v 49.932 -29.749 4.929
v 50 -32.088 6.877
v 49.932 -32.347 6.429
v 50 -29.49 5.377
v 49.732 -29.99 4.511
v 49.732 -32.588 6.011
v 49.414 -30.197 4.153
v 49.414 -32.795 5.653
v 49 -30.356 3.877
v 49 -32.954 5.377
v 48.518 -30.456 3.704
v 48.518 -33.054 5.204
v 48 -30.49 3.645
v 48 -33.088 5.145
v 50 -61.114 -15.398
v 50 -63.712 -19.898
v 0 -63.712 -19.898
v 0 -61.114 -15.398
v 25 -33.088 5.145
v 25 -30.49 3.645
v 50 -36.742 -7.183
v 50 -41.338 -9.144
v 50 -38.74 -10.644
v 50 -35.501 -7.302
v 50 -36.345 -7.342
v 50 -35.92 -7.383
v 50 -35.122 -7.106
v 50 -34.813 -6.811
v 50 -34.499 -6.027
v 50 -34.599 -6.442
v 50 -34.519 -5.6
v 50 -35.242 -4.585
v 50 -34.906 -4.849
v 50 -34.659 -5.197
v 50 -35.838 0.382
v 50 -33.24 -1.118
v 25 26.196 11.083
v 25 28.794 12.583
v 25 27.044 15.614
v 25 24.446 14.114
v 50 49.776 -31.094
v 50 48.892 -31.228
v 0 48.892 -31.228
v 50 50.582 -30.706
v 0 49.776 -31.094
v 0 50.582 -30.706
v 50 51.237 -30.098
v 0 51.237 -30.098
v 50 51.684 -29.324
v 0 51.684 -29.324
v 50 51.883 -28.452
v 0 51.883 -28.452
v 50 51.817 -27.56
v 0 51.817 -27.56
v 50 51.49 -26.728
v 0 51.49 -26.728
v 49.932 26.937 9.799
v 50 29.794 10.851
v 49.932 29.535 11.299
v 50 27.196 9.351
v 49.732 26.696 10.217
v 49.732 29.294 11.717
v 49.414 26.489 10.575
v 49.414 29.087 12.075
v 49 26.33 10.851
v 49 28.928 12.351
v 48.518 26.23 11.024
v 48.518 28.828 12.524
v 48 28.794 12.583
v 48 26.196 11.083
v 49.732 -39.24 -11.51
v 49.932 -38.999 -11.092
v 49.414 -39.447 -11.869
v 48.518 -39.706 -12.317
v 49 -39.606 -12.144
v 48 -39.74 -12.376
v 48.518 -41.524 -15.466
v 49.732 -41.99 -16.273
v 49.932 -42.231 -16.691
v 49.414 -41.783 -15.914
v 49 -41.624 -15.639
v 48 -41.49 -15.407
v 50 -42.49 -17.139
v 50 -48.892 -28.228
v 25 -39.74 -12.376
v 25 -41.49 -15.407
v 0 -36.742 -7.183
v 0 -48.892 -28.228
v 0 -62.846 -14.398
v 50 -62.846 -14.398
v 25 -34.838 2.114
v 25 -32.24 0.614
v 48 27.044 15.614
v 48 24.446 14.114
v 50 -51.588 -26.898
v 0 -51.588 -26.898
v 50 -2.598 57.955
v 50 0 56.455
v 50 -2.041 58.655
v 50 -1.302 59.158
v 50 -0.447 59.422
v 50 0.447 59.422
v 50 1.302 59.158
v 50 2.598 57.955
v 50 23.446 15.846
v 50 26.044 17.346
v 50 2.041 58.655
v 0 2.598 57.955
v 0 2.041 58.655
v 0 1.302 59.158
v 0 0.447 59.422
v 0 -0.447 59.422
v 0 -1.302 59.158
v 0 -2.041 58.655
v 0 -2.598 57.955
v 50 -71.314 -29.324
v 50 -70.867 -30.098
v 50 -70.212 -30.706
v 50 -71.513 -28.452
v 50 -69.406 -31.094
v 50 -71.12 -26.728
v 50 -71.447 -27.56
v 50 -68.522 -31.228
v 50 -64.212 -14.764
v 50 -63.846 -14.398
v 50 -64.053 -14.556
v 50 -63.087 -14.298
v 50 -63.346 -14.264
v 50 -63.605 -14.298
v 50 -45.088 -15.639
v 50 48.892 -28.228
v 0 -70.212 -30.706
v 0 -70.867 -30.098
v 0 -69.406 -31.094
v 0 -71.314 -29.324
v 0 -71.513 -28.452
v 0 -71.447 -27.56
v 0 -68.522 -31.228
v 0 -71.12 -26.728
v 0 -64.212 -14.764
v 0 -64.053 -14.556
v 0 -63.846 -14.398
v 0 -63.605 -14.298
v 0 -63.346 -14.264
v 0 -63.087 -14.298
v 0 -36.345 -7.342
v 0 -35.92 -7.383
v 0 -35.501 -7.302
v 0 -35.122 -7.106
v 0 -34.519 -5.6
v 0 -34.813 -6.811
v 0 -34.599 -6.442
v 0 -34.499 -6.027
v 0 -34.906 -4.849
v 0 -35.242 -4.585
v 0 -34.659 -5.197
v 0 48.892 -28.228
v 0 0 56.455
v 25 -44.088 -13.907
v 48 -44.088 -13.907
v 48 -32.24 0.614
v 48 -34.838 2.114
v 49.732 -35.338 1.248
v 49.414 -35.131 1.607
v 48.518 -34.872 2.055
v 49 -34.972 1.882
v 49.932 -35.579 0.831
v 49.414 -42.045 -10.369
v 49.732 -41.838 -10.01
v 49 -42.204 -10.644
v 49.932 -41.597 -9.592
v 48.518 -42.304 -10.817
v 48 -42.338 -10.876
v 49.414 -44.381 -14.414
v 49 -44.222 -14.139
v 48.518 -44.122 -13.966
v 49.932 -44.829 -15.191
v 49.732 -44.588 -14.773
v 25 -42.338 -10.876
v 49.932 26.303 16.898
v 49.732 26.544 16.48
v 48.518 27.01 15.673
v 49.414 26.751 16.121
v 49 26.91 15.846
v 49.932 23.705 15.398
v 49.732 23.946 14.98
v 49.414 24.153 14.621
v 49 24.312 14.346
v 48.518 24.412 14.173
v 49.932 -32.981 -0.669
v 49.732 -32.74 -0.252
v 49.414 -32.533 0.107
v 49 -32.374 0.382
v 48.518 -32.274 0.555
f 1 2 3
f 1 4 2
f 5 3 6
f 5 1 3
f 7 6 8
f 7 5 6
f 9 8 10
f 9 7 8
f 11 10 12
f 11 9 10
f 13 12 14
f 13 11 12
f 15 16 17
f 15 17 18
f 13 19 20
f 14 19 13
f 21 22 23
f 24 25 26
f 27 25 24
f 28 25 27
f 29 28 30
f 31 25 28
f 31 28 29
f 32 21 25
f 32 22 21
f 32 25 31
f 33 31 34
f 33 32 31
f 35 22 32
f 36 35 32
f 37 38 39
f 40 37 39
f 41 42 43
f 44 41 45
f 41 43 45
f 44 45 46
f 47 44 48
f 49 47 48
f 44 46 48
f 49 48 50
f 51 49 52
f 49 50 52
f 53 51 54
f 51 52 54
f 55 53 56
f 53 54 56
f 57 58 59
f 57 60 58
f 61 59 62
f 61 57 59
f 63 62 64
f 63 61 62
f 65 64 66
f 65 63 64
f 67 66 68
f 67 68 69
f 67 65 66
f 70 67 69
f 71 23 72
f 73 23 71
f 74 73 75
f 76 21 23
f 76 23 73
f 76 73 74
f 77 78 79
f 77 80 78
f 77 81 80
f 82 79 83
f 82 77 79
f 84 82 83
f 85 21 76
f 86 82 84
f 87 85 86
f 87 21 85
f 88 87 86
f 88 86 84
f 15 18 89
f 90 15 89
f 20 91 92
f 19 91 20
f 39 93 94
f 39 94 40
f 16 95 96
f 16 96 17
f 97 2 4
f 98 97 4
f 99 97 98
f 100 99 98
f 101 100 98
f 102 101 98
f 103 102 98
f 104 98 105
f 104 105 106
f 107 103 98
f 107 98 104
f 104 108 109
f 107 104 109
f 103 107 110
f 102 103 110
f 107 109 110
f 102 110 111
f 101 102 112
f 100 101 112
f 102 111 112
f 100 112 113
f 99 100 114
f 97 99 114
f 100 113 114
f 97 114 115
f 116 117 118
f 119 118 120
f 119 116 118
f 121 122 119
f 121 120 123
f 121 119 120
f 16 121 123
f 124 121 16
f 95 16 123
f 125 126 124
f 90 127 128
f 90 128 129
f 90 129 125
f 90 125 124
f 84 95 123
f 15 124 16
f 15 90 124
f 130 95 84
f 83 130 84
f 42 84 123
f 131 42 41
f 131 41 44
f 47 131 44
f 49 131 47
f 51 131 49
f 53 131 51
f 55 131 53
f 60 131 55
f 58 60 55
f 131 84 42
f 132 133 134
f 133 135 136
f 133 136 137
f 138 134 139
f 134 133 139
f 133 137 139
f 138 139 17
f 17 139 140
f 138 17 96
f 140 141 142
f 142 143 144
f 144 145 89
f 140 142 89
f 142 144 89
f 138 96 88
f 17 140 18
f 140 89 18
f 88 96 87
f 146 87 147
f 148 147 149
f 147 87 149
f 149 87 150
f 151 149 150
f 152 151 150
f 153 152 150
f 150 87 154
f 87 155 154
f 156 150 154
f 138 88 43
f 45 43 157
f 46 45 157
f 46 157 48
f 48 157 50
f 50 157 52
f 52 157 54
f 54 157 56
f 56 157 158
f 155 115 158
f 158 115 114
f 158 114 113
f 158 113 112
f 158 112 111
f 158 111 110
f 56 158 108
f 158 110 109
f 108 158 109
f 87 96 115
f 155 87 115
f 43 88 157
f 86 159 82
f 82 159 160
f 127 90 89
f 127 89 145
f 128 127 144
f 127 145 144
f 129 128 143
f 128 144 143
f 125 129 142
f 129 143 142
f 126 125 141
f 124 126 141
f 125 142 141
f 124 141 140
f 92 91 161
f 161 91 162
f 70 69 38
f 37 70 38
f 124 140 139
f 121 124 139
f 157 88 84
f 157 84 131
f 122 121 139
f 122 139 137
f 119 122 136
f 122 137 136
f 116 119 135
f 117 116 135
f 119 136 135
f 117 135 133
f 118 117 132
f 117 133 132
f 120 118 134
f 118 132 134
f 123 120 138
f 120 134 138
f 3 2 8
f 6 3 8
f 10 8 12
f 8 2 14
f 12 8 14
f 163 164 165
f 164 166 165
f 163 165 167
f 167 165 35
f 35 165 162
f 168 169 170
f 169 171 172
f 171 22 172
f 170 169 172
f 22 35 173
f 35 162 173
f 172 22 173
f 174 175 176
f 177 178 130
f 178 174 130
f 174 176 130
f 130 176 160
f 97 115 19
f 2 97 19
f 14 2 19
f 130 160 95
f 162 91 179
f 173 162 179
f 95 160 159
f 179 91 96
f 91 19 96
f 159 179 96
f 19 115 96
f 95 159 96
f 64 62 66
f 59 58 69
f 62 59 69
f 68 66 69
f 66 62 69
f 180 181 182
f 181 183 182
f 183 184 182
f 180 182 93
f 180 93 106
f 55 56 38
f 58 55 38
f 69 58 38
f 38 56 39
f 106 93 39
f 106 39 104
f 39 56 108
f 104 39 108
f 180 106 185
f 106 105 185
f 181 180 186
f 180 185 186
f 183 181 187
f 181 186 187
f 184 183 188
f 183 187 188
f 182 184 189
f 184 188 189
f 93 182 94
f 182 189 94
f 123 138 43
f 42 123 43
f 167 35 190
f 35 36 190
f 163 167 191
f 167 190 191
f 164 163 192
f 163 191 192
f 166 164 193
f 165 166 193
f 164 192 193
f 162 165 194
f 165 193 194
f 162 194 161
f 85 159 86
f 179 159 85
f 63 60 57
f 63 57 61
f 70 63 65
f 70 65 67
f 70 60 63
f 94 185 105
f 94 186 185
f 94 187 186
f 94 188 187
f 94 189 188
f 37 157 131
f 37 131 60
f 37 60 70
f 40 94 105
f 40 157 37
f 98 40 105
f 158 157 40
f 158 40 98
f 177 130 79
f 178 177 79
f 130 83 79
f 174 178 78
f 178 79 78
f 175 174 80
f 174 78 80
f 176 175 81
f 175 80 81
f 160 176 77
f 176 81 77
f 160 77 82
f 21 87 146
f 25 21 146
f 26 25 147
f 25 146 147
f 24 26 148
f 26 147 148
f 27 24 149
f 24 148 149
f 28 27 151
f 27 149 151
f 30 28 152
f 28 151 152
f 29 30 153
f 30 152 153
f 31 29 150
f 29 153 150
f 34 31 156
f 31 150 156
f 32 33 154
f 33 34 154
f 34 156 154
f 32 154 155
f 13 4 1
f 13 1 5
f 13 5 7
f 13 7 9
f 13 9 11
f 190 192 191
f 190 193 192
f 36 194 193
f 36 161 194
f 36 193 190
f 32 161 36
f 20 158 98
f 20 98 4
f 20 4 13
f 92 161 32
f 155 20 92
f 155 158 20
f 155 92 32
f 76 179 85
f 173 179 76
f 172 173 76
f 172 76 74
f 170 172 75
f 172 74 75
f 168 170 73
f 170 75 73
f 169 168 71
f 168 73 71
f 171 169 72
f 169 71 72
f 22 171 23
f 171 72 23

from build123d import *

# Parameters (mm, degrees)
F1_DEPTH  = 50
F2_T      = 3
F4_DEPTH  = 50
F5_W      = 25
F5_H      = 3.5
F6_DEPTH  = 3
F7_W      = 25
F7_H      = 3.5
F8_DEPTH  = 3
F9_R      = 2
F10_R     = 1.5
F11_DEPTH = 50
F12_W     = 25
F12_H     = 3.5
F13_DEPTH = 10
F14_R     = 2


# Not quite as in the source:
# - a shell that OpenCascade refuses in one call is made with other operations: the cavity is built on its own and cut out


with BuildPart() as f1:
    # F0 (on Right) → F1 (new body)
    with BuildSketch(Plane.YZ):
        with BuildLine():
            Line((-2.5980762114, 57.9554029985), (-54.0879656003, -31.2277014993))
            Line((-54.0879656003, -31.2277014993), (48.8918131776, -31.2277014993))
            ThreePointArc((48.8918131776, -31.2277014993), (51.4898893889, -29.7277014993), (51.4898893889, -26.7277014993))
            Line((51.4898893889, -26.7277014993), (2.5980762114, 57.9554029985))
            ThreePointArc((2.5980762114, 57.9554029985), (0, 59.4554029985), (-2.5980762114, 57.9554029985))
        make_face()
    extrude(amount=F1_DEPTH)

    # F2: shell of thickness 3, made by hand


with BuildPart() as f2_core1:
    # F2_t2: copy of F1
    add(f1.part)

    # the walls: a layer under each face that stays
    f2_faces = [f2_core1.faces().sort_by_distance(p)[0] for p in [
        (25, -28.3430209058, 13.3638507496),
        (25, -2.5980762114, -31.2277014993),
        (25, 27.0439828001, 15.6138507496),
    ]]
    thicken(f2_faces, amount=-F2_T, mode=Mode.SUBTRACT)


with BuildPart() as f1_1:
    add(f1.part)

    # what is left inside the walls is the cavity
    f2_cavity = [f2_core1.part.solids().sort_by_distance(p)[0] for p in [
        (33.333333, -24.419926, 14.098851),
    ]]
    add(f2_cavity, mode=Mode.SUBTRACT)

    # F3 (on Right) → F4 (join)
    with BuildSketch(Plane.YZ):
        with BuildLine():
            Line((-54.0879656003, -31.2277014993), (-51.5879656003, -26.8975744803))
            Line((-51.5879656003, -26.8975744803), (-63.7123212533, -19.8975744803))
            Line((-63.7123212533, -19.8975744803), (-61.1142450419, -15.3975744803))
            Line((-61.1142450419, -15.3975744803), (-62.8462958495, -14.3975744803))
            ThreePointArc((-62.8462958495, -14.3975744803), (-63.6051148946, -14.2976740578), (-64.2123212533, -14.7635998841))
            Line((-64.2123212533, -14.7635998841), (-71.1197985414, -26.7277014993))
            ThreePointArc((-71.1197985414, -26.7277014993), (-71.1197985414, -29.7277014993), (-68.52172233, -31.2277014993))
            Line((-68.52172233, -31.2277014993), (-54.0879656003, -31.2277014993))
        make_face()
    extrude(amount=F4_DEPTH)

    # F5 (on face) → F6 (cut, through all)
    with BuildSketch(Plane(origin=(0, -27.0439828002, 15.6138507496), x_dir=(1, 0, 0), z_dir=(0, -0.8660254038, 0.5))):
        with Locations((37.5, -32.3379656003)):
            Rectangle(F5_W, F5_H)
    extrude(amount=-F6_DEPTH, mode=Mode.SUBTRACT)

    # F7 (on face) → F8 (cut, through all)
    with BuildSketch(Plane(origin=(0, -27.0439828002, 15.6138507496), x_dir=(1, 0, 0), z_dir=(0, -0.8660254038, 0.5))):
        with Locations((37.5, -13.8379656003)):
            Rectangle(F7_W, F7_H)
    extrude(amount=-F8_DEPTH, mode=Mode.SUBTRACT)

    # F9
    f9_edges = [f1_1.edges().sort_by_distance(p)[0] for p in [
        (50, -31.788927, 4.395365),
        (50, -33.538927, 1.364277),
        (50, -41.038927, -11.626105),
        (50, -42.788927, -14.657193),
    ]]
    fillet(f9_edges, radius=F9_R)

    # F10 (on Right) → F11 (join)
    with BuildSketch(Plane.YZ):
        with Locations((-35.9918131776, -5.8842460816)):
            Circle(F10_R)
    extrude(amount=F11_DEPTH)

    # F12 (on face) → F13 (cut)
    with BuildSketch(Plane(origin=(0, 27.0439828001, 15.6138507496), x_dir=(-1, 0, 0), z_dir=(0, 0.8660254038, 0.5))):
        with Locations((-37.5, -1.75)):
            Rectangle(F12_W, F12_H)
    extrude(amount=-F13_DEPTH, mode=Mode.SUBTRACT)

    # F14
    f14_edges = [f1_1.edges().sort_by_distance(p)[0] for p in [
        (50, 27.494945, 11.832762),
        (50, 25.744945, 14.863851),
    ]]
    fillet(f14_edges, radius=F14_R)


solid = f1_1.part
